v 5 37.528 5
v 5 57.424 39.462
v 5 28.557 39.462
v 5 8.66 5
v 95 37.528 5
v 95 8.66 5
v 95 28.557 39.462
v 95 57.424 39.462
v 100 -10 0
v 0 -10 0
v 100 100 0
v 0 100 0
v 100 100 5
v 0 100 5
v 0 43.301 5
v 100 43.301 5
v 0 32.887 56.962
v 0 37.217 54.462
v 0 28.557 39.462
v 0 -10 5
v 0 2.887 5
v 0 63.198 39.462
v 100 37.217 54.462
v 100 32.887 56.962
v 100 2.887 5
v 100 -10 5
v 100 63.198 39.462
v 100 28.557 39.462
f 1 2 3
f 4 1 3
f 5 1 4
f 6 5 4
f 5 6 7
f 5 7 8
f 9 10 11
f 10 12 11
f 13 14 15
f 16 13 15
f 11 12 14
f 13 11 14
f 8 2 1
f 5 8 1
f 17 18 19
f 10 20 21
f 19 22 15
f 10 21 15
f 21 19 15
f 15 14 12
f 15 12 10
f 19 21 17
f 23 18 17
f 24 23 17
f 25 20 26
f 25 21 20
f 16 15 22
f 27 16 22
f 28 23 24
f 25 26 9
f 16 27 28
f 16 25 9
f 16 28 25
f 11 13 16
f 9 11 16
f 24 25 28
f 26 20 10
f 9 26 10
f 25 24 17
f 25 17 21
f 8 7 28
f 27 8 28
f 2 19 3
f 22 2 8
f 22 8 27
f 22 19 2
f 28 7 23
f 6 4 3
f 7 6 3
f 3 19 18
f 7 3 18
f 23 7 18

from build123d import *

# Parameters (mm, degrees)
F1_DEPTH = 100
F3_DEPTH = 5
F5_DEPTH = 5
F6_DEPTH = 10


with BuildPart() as f1:
    # F0 (on Right) → F1 (new body)
    with BuildSketch(Plane.YZ):
        Polygon((0, 5), (0, 0), (100, 0), (100, 5), (43.3012701892, 5), (63.1976404784, 39.4615242271), (57.4241377865, 39.4615242271), (37.5277674973, 5), (8.6602540378, 5), (37.2168783649, 54.4615242271), (32.8867513459, 56.9615242271), (2.8867513459, 5), align=None)
    extrude(amount=F1_DEPTH)

    # F2 (on face) → F3 (join)
    with BuildSketch(Plane.YZ.offset(100)):
        Polygon((37.5277674973, 5), (57.4241377865, 39.4615242271), (28.556624327, 39.4615242271), (8.6602540378, 5), align=None)
    extrude(amount=-F3_DEPTH)

    # F4 (on face) → F5 (join)
    with BuildSketch(Plane(origin=(0, 0, 0), x_dir=(0, -1, 0), z_dir=(-1, 0, 0))):
        Polygon((-28.556624327, 39.4615242271), (-57.4241377865, 39.4615242271), (-37.5277674973, 5), (-8.6602540378, 5), align=None)
    extrude(amount=-F5_DEPTH)

    # F6 (add): a face of the model
    f6_faces = [f1.faces().sort_by_distance(p)[0] for p in [
        (50, 0, 2.5),
    ]]
    extrude(f6_faces, amount=F6_DEPTH)


solid = f1.part
